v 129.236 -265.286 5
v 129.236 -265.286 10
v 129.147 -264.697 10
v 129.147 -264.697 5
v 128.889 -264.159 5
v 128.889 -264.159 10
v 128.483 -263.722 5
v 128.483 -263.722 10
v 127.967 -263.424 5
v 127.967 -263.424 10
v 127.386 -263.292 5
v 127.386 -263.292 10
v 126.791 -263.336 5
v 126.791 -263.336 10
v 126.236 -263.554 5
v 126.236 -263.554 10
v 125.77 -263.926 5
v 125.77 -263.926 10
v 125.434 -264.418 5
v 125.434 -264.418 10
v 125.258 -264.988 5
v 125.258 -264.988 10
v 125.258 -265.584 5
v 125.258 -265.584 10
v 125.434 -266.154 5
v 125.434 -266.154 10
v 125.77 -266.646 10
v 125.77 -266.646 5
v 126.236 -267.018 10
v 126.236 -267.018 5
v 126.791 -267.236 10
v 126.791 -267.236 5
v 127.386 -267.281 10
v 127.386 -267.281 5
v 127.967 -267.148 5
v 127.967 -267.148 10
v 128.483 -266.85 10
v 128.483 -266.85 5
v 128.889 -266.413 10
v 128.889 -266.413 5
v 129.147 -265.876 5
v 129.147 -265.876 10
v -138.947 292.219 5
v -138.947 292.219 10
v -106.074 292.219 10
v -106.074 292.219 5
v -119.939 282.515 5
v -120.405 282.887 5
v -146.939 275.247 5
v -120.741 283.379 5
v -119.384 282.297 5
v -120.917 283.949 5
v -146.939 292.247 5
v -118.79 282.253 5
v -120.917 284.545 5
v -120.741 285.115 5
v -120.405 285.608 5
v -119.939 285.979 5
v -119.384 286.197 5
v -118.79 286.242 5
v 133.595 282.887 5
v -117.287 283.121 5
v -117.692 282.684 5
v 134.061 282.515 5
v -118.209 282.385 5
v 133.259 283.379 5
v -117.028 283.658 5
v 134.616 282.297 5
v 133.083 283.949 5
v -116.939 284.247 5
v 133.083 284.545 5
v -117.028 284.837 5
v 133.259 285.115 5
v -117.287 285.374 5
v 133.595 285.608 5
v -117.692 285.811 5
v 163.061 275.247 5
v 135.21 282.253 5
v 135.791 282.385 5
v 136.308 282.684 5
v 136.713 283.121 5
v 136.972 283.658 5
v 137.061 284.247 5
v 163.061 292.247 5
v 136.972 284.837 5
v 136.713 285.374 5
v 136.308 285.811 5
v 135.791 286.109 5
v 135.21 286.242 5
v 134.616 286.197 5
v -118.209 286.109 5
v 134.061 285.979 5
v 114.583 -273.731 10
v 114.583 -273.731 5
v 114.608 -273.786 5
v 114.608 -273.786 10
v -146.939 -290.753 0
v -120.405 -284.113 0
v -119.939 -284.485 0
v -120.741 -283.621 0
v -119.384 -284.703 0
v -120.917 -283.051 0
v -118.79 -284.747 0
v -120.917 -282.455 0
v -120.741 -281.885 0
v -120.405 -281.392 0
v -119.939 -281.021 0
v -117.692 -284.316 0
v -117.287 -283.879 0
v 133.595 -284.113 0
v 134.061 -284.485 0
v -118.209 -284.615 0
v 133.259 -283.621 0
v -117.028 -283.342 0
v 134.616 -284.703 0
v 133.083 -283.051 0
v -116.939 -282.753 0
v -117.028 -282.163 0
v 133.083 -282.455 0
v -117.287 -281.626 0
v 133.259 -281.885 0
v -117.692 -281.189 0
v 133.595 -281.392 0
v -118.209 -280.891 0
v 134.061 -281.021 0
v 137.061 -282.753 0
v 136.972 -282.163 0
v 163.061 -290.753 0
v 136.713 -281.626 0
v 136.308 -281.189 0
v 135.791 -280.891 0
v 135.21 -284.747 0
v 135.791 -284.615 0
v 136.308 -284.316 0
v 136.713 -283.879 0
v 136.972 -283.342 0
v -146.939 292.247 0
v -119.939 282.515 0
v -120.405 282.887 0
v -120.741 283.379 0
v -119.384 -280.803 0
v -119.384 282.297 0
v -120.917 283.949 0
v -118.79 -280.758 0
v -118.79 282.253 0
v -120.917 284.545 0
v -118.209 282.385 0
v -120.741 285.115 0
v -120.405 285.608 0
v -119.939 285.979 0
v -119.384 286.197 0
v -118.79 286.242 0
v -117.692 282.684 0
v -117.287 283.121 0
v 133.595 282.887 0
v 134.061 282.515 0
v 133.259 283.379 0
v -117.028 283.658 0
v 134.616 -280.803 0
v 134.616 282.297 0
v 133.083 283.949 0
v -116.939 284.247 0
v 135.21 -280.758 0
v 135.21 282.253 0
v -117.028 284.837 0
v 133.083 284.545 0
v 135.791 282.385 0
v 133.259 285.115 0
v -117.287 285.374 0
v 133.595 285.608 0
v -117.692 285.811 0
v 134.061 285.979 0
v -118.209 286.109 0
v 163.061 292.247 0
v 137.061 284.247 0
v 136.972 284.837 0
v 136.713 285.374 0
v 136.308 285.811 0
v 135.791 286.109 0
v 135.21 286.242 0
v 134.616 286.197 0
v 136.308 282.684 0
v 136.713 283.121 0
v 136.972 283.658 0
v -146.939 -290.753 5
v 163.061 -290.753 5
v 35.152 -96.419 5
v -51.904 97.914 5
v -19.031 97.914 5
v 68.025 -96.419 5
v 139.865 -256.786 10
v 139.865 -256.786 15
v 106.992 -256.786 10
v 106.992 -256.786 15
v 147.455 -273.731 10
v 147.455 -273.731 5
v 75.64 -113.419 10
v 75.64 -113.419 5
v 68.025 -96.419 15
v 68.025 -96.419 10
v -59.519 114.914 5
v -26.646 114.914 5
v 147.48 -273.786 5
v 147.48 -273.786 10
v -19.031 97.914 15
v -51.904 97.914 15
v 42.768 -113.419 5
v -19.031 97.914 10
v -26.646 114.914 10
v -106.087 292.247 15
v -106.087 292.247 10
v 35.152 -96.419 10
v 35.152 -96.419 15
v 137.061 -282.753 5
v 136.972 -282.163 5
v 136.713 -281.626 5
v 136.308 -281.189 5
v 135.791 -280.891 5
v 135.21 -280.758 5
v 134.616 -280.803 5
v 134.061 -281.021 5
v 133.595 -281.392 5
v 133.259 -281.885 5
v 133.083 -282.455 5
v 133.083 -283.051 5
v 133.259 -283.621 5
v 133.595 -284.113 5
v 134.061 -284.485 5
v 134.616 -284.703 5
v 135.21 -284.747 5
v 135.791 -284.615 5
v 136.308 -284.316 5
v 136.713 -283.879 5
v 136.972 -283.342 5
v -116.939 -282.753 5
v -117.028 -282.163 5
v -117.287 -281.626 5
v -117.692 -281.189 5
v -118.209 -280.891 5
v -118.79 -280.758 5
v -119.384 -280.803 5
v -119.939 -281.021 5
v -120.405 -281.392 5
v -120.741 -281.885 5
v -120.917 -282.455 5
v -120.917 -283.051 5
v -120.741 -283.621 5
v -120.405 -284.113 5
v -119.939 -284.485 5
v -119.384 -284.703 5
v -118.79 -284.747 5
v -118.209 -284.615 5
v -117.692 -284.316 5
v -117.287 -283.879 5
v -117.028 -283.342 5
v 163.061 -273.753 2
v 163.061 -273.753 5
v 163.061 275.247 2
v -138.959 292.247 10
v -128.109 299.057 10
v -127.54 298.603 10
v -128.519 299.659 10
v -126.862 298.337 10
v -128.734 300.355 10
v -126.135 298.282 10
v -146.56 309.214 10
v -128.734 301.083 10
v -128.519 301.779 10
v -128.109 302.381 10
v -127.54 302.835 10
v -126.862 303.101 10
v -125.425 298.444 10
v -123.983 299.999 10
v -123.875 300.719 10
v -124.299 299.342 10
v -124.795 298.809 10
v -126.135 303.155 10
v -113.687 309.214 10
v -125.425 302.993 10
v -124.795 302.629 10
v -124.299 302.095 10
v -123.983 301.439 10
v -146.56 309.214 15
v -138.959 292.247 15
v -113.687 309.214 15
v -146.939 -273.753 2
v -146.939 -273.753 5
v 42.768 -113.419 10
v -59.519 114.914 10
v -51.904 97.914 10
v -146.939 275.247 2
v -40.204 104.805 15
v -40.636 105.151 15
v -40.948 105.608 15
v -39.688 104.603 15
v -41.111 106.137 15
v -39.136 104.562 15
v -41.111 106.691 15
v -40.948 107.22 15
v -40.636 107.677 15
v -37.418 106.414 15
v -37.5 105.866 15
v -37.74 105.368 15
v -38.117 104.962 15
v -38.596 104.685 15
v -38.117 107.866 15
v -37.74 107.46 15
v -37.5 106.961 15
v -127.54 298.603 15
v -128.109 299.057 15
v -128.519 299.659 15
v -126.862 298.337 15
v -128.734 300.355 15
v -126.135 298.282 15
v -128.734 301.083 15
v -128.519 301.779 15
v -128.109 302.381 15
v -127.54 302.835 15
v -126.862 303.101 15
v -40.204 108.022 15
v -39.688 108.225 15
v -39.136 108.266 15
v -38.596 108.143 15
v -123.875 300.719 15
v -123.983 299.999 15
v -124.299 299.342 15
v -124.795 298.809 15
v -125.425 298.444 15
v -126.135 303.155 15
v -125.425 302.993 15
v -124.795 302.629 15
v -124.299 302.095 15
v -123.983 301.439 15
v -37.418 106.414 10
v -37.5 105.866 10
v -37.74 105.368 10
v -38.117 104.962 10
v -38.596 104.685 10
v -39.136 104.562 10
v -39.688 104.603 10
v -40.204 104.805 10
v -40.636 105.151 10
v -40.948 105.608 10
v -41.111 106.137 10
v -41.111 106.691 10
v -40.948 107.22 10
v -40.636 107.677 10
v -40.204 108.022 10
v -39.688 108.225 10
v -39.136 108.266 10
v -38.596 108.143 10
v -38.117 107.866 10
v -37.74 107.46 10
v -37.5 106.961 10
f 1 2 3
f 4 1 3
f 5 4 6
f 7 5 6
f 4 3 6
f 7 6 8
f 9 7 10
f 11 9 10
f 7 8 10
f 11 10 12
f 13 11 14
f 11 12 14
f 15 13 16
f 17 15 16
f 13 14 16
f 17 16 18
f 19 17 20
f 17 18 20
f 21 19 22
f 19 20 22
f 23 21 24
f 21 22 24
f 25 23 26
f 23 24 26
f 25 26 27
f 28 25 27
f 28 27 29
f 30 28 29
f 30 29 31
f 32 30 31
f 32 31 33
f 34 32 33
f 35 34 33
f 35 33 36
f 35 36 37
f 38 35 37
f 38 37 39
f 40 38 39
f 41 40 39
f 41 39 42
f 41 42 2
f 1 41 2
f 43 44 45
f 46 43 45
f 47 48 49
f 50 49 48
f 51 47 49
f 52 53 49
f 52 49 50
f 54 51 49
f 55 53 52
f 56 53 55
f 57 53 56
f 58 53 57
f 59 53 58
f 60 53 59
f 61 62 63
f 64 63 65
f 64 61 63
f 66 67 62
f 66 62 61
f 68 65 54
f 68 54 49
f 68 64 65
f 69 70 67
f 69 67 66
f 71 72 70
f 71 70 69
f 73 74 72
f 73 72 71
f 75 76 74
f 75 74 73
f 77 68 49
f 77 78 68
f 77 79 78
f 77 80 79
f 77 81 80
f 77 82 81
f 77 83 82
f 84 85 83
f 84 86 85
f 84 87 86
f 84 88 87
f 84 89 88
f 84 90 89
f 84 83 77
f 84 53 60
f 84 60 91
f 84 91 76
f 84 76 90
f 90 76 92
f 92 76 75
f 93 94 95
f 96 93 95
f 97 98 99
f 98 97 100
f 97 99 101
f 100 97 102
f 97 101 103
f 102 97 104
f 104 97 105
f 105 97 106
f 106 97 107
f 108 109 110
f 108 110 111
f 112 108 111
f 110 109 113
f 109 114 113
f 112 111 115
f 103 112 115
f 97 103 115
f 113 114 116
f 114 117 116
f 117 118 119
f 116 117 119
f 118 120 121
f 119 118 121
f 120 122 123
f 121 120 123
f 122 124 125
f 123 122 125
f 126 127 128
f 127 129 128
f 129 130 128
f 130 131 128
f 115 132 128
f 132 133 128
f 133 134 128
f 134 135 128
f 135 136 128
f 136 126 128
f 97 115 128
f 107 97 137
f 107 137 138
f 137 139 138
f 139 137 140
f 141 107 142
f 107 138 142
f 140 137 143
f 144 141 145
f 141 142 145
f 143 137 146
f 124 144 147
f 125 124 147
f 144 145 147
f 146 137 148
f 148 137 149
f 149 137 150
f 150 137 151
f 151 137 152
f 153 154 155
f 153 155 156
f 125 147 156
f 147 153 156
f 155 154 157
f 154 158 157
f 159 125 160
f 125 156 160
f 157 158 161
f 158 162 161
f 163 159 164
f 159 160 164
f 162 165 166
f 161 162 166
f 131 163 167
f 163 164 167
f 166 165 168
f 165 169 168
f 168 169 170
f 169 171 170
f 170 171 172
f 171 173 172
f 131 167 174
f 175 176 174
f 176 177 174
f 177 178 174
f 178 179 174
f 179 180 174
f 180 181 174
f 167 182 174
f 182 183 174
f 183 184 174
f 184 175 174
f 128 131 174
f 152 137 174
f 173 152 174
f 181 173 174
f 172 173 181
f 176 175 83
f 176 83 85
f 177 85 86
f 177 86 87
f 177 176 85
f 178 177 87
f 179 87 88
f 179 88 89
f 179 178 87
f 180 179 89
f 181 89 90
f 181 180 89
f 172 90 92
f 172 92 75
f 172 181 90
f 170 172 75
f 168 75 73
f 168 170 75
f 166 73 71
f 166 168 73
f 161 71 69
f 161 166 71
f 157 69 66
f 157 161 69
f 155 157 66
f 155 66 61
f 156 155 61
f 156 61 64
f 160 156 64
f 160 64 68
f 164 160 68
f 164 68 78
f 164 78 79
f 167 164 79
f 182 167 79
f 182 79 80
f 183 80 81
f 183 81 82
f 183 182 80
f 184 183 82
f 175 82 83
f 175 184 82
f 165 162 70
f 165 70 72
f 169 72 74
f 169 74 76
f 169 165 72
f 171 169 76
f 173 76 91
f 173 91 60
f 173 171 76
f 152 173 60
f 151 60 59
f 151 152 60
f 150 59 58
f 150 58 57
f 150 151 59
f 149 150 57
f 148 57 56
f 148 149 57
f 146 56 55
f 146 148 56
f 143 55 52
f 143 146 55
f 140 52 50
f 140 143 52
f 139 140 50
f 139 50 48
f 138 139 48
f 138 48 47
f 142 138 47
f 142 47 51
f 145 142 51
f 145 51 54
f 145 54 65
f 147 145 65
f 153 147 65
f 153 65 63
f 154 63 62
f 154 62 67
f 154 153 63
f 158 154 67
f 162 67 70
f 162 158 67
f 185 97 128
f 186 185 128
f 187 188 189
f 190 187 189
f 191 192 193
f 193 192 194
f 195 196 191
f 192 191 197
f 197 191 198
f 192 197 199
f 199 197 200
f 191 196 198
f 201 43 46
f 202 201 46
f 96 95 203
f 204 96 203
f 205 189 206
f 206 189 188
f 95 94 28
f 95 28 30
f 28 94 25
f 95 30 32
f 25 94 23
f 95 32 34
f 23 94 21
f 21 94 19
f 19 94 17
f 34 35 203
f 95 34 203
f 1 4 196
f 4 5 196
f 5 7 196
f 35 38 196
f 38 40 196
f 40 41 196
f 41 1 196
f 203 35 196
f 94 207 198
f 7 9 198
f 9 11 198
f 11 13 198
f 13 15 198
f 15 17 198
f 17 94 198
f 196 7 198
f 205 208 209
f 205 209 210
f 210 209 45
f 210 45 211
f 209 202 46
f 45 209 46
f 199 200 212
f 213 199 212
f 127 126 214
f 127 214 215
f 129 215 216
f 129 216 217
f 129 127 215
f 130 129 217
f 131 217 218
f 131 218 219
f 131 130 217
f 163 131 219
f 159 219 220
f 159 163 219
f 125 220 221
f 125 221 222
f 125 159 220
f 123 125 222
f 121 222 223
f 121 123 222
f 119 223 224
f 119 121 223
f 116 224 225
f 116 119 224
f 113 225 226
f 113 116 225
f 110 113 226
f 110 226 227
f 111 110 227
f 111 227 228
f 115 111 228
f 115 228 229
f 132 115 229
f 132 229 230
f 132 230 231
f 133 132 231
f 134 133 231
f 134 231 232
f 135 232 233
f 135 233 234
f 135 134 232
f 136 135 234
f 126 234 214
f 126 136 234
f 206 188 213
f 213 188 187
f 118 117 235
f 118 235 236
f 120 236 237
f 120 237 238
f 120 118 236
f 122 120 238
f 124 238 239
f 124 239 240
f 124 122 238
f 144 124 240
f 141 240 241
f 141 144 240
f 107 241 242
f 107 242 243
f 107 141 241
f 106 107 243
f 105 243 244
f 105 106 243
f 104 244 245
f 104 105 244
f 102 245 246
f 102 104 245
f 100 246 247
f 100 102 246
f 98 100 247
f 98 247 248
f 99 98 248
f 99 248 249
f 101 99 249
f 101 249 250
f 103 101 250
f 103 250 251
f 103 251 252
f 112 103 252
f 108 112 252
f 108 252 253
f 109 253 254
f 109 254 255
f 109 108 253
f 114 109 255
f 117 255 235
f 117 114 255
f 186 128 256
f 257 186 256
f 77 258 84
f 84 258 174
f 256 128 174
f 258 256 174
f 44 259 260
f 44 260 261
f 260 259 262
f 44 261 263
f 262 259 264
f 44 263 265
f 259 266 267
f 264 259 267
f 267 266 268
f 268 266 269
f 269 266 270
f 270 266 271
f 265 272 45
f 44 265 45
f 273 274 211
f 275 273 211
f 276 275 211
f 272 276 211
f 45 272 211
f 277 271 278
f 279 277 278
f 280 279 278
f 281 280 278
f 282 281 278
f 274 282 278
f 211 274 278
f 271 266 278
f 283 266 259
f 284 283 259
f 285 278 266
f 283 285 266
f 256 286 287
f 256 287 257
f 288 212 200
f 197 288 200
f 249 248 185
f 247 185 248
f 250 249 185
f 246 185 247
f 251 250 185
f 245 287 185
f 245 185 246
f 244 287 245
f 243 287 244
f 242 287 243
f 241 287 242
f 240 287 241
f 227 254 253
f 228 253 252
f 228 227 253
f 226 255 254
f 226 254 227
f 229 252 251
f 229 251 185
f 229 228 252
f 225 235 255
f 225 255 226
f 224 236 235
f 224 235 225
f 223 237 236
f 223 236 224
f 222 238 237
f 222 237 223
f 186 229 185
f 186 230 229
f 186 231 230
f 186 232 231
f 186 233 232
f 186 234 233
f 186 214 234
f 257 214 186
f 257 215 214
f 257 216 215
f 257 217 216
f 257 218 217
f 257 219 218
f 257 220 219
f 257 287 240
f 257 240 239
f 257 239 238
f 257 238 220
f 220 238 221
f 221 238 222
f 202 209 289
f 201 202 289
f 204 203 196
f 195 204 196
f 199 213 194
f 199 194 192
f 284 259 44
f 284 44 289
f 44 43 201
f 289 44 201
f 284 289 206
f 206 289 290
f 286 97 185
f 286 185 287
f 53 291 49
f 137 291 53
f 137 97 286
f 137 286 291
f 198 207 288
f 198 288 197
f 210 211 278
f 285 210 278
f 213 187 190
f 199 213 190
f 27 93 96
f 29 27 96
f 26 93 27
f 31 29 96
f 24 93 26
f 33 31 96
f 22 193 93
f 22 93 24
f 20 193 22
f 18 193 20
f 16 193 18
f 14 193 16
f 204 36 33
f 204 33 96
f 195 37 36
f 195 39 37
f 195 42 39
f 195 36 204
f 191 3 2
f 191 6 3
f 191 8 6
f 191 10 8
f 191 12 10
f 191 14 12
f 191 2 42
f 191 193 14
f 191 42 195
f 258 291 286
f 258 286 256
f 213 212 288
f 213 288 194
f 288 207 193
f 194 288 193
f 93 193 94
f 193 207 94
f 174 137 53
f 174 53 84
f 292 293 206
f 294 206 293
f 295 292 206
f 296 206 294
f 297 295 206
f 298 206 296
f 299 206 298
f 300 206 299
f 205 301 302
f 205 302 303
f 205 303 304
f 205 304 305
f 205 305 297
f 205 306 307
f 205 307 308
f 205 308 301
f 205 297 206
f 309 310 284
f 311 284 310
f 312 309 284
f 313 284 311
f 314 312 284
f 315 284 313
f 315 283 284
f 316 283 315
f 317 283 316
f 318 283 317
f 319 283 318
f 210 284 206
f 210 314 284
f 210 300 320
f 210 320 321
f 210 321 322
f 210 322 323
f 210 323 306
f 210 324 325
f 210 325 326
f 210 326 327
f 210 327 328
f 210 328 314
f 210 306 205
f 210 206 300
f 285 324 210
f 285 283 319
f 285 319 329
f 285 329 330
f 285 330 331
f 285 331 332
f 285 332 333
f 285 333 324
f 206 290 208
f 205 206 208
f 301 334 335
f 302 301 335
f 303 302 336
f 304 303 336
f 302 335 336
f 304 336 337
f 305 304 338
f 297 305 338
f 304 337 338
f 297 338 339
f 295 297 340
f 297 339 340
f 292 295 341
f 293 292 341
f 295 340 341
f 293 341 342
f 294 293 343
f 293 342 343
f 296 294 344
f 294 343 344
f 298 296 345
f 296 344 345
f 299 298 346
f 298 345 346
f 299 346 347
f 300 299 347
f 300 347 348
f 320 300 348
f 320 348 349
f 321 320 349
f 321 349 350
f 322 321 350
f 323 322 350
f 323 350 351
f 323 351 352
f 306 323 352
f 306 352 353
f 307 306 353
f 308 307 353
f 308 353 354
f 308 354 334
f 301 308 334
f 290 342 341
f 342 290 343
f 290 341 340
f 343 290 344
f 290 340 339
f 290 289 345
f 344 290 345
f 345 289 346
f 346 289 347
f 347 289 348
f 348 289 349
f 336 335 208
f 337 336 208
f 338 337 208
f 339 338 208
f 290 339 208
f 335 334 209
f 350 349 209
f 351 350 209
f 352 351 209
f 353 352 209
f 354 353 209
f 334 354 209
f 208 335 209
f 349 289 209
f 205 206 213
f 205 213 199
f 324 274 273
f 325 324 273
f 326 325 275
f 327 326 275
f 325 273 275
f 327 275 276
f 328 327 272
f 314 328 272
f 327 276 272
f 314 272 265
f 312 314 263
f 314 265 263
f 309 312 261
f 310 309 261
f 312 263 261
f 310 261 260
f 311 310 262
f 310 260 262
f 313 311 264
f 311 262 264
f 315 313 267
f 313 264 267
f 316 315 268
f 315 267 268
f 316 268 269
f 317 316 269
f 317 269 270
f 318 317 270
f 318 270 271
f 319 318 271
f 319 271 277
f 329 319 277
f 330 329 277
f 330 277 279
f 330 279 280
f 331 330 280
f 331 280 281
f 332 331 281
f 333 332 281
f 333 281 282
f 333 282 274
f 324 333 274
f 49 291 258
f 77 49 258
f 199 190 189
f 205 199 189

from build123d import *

# Parameters (mm, degrees)
F0_W      = 310
F0_H      = 17
F0_R      = 2
F1_DEPTH  = 5
F0_H_2    = 549
F2_DEPTH  = 2
F4_DEPTH  = 10
F3_R      = 2
F6_DEPTH  = 5
F8_DEPTH  = 5
F9_R      = 2
F10_DEPTH = 25
F12_START = -5
F12_DEPTH = 5
F13_DEPTH = 10
F14_DEPTH = 5
F15_R     = 2.4432897083
F16_DEPTH = 25
F17_R     = 1.8572425824
F18_DEPTH = 25


# Not quite as in the source:
# - a feature names something its author has since deleted; it is built from what else it names


with BuildPart() as f1:
    # F0 (on Top) → F1 (new body)
    with BuildSketch(Plane.XY):
        with Locations((8.0607275963, 283.7472317666)):
            Rectangle(F0_W, F0_H)
        with Locations((-118.9392724037, 284.2472317666)):
            Circle(F0_R, mode=Mode.SUBTRACT)
        with Locations((135.0607275963, 284.2472317666)):
            Circle(F0_R, mode=Mode.SUBTRACT)
    extrude(amount=F1_DEPTH)



with BuildPart() as f1b:
    # F0 (on Top) → F1, piece 2 (new body)
    with BuildSketch(Plane.XY):
        with Locations((8.0607275963, -282.2527682334)):
            Rectangle(F0_W, F0_H)
        with Locations((-118.9392724037, -282.7527682334)):
            Circle(F0_R, mode=Mode.SUBTRACT)
        with Locations((135.0607275963, -282.7527682334)):
            Circle(F0_R, mode=Mode.SUBTRACT)
    extrude(amount=F1_DEPTH)


with BuildPart() as f1_1:
    add(f1.part)

    add(f1b.part)  # F2 merges F1b
    # F0 (on Top) → F2 (join)
    with BuildSketch(Plane.XY):
        with Locations((8.0607275963, 0.7472317666)):
            Rectangle(F0_W, F0_H_2)
    extrude(amount=F2_DEPTH)

    # F11 (on face) → F14 (cut)
    with BuildSketch(Plane.XY.offset(15)):
        Polygon((-19.030874229, 97.9138984332), (-26.6463945112, 114.9138984332), (-59.5190403609, 114.9138984332), (-51.9035200787, 97.9138984332), align=None)
        Polygon((-95.7537963986, 309.2138984332), (-113.6873116188, 309.2138984332), (-106.0740024037, 292.2188341618), (-95.7537963986, 292.2188341618), align=None)
        Polygon((-106.0740024037, 292.2188341618), (-113.6873116188, 309.2138984332), (-146.5599574685, 309.2138984332), (-138.9466482534, 292.2188341618), align=None)
        Polygon((-138.9466482534, 292.2188341618), (-146.5599574685, 309.2138984332), (-168.3874875307, 309.2138984332), (-168.3874875307, 292.2188341618), align=None)
    extrude(amount=F14_DEPTH, mode=Mode.SUBTRACT)


with BuildPart() as f4:
    # F3 (on face) → F4 (new body)
    with BuildSketch(Plane.XY.offset(5)):
        Polygon((147.4554403895, -273.7307487662), (114.5827945397, -273.7307487662), (114.6075910324, -273.7861015668), (147.4802368821, -273.7861015668), align=None)
        Polygon((68.0249752713, -96.4194349001), (35.1523294216, -96.4194349001), (114.5827945397, -273.7307487662), (147.4554403895, -273.7307487662), align=None)
    extrude(amount=F4_DEPTH)

    # F5 (on face) → F6 (cut)
    with BuildSketch(Plane.XY.offset(15)):
        Polygon((114.6075910324, -273.7861015668), (147.4802368821, -273.7861015668), (139.8647165999, -256.7861015668), (106.9920707502, -256.7861015668), align=None)
    extrude(amount=-F6_DEPTH, mode=Mode.SUBTRACT)

    # F7 (on face) → F8 (cut)
    with BuildSketch(Plane.XY.offset(5)):
        Polygon((68.0249752713, -96.4194349001), (35.1523294216, -96.4194349001), (42.7678497038, -113.4194349001), (75.6404955535, -113.4194349001), align=None)
    extrude(amount=F8_DEPTH, mode=Mode.SUBTRACT)

    # F9 (on face) → F10 (cut)
    with BuildSketch(Plane.XY.offset(10)):
        with Locations((127.2361538162, -265.2861015668)):
            Circle(F9_R)
    extrude(amount=-F10_DEPTH, mode=Mode.SUBTRACT)


with BuildPart() as f4b:
    # F3 (on face) → F4, piece 2 (new body)
    with BuildSketch(Plane.XY.offset(5)):
        Polygon((-131.3438492968, 275.2472317666), (-51.9035200787, 97.9138984332), (-19.030874229, 97.9138984332), (-98.4712034471, 275.2472317666), align=None)
        Polygon((-138.959369579, 292.2472317666), (-131.3438492968, 275.2472317666), (-98.4712034471, 275.2472317666), (-106.0867237293, 292.2472317666), align=None)
        with Locations((-118.9392724037, 284.2472317666)):
            Circle(F3_R, mode=Mode.SUBTRACT)
        Polygon((-146.5599574685, 309.2138984332), (-138.959369579, 292.2472317666), (-106.0867237293, 292.2472317666), (-113.6873116188, 309.2138984332), align=None)
        with Locations((-118.9392724037, 284.2472317666)):
            Circle(F3_R)
    extrude(amount=F4_DEPTH)

    # F11 (on face) → F12 (cut)
    with BuildSketch(Plane.XY.offset(15).offset(F12_START)):
        Polygon((-19.030874229, 97.9138984332), (-26.6463945112, 114.9138984332), (-59.5190403609, 114.9138984332), (-51.9035200787, 97.9138984332), align=None)
        Polygon((-106.0740024037, 292.2188341618), (-113.6873116188, 309.2138984332), (-146.5599574685, 309.2138984332), (-138.9466482534, 292.2188341618), align=None)
    extrude(amount=-F12_DEPTH, mode=Mode.SUBTRACT)

    # F15 (on face) → F16 (cut)
    with BuildSketch(Plane(origin=(0, 0, 10), x_dir=(1, 0, 0), z_dir=(0, 0, -1))):
        with Locations((-126.3180854696, -300.7188341618)):
            Circle(F15_R)
    extrude(amount=-F16_DEPTH, mode=Mode.SUBTRACT)

    # F17 (on face) → F18 (cut)
    with BuildSketch(Plane(origin=(0, 0, 10), x_dir=(1, 0, 0), z_dir=(0, 0, -1))):
        with Locations((-39.274957295, -106.4138984332)):
            Circle(F17_R)
    extrude(amount=-F18_DEPTH, mode=Mode.SUBTRACT)


with BuildPart() as f13:
    # F3 (on face) → F13 (new body)
    with BuildSketch(Plane.XY.offset(5)):
        Polygon((-19.030874229, 97.9138984332), (-51.9035200787, 97.9138984332), (35.1523294216, -96.4194349001), (68.0249752713, -96.4194349001), align=None)
    extrude(amount=F13_DEPTH)


solid = Compound([f1_1.part, f4.part, f4b.part, f13.part])
